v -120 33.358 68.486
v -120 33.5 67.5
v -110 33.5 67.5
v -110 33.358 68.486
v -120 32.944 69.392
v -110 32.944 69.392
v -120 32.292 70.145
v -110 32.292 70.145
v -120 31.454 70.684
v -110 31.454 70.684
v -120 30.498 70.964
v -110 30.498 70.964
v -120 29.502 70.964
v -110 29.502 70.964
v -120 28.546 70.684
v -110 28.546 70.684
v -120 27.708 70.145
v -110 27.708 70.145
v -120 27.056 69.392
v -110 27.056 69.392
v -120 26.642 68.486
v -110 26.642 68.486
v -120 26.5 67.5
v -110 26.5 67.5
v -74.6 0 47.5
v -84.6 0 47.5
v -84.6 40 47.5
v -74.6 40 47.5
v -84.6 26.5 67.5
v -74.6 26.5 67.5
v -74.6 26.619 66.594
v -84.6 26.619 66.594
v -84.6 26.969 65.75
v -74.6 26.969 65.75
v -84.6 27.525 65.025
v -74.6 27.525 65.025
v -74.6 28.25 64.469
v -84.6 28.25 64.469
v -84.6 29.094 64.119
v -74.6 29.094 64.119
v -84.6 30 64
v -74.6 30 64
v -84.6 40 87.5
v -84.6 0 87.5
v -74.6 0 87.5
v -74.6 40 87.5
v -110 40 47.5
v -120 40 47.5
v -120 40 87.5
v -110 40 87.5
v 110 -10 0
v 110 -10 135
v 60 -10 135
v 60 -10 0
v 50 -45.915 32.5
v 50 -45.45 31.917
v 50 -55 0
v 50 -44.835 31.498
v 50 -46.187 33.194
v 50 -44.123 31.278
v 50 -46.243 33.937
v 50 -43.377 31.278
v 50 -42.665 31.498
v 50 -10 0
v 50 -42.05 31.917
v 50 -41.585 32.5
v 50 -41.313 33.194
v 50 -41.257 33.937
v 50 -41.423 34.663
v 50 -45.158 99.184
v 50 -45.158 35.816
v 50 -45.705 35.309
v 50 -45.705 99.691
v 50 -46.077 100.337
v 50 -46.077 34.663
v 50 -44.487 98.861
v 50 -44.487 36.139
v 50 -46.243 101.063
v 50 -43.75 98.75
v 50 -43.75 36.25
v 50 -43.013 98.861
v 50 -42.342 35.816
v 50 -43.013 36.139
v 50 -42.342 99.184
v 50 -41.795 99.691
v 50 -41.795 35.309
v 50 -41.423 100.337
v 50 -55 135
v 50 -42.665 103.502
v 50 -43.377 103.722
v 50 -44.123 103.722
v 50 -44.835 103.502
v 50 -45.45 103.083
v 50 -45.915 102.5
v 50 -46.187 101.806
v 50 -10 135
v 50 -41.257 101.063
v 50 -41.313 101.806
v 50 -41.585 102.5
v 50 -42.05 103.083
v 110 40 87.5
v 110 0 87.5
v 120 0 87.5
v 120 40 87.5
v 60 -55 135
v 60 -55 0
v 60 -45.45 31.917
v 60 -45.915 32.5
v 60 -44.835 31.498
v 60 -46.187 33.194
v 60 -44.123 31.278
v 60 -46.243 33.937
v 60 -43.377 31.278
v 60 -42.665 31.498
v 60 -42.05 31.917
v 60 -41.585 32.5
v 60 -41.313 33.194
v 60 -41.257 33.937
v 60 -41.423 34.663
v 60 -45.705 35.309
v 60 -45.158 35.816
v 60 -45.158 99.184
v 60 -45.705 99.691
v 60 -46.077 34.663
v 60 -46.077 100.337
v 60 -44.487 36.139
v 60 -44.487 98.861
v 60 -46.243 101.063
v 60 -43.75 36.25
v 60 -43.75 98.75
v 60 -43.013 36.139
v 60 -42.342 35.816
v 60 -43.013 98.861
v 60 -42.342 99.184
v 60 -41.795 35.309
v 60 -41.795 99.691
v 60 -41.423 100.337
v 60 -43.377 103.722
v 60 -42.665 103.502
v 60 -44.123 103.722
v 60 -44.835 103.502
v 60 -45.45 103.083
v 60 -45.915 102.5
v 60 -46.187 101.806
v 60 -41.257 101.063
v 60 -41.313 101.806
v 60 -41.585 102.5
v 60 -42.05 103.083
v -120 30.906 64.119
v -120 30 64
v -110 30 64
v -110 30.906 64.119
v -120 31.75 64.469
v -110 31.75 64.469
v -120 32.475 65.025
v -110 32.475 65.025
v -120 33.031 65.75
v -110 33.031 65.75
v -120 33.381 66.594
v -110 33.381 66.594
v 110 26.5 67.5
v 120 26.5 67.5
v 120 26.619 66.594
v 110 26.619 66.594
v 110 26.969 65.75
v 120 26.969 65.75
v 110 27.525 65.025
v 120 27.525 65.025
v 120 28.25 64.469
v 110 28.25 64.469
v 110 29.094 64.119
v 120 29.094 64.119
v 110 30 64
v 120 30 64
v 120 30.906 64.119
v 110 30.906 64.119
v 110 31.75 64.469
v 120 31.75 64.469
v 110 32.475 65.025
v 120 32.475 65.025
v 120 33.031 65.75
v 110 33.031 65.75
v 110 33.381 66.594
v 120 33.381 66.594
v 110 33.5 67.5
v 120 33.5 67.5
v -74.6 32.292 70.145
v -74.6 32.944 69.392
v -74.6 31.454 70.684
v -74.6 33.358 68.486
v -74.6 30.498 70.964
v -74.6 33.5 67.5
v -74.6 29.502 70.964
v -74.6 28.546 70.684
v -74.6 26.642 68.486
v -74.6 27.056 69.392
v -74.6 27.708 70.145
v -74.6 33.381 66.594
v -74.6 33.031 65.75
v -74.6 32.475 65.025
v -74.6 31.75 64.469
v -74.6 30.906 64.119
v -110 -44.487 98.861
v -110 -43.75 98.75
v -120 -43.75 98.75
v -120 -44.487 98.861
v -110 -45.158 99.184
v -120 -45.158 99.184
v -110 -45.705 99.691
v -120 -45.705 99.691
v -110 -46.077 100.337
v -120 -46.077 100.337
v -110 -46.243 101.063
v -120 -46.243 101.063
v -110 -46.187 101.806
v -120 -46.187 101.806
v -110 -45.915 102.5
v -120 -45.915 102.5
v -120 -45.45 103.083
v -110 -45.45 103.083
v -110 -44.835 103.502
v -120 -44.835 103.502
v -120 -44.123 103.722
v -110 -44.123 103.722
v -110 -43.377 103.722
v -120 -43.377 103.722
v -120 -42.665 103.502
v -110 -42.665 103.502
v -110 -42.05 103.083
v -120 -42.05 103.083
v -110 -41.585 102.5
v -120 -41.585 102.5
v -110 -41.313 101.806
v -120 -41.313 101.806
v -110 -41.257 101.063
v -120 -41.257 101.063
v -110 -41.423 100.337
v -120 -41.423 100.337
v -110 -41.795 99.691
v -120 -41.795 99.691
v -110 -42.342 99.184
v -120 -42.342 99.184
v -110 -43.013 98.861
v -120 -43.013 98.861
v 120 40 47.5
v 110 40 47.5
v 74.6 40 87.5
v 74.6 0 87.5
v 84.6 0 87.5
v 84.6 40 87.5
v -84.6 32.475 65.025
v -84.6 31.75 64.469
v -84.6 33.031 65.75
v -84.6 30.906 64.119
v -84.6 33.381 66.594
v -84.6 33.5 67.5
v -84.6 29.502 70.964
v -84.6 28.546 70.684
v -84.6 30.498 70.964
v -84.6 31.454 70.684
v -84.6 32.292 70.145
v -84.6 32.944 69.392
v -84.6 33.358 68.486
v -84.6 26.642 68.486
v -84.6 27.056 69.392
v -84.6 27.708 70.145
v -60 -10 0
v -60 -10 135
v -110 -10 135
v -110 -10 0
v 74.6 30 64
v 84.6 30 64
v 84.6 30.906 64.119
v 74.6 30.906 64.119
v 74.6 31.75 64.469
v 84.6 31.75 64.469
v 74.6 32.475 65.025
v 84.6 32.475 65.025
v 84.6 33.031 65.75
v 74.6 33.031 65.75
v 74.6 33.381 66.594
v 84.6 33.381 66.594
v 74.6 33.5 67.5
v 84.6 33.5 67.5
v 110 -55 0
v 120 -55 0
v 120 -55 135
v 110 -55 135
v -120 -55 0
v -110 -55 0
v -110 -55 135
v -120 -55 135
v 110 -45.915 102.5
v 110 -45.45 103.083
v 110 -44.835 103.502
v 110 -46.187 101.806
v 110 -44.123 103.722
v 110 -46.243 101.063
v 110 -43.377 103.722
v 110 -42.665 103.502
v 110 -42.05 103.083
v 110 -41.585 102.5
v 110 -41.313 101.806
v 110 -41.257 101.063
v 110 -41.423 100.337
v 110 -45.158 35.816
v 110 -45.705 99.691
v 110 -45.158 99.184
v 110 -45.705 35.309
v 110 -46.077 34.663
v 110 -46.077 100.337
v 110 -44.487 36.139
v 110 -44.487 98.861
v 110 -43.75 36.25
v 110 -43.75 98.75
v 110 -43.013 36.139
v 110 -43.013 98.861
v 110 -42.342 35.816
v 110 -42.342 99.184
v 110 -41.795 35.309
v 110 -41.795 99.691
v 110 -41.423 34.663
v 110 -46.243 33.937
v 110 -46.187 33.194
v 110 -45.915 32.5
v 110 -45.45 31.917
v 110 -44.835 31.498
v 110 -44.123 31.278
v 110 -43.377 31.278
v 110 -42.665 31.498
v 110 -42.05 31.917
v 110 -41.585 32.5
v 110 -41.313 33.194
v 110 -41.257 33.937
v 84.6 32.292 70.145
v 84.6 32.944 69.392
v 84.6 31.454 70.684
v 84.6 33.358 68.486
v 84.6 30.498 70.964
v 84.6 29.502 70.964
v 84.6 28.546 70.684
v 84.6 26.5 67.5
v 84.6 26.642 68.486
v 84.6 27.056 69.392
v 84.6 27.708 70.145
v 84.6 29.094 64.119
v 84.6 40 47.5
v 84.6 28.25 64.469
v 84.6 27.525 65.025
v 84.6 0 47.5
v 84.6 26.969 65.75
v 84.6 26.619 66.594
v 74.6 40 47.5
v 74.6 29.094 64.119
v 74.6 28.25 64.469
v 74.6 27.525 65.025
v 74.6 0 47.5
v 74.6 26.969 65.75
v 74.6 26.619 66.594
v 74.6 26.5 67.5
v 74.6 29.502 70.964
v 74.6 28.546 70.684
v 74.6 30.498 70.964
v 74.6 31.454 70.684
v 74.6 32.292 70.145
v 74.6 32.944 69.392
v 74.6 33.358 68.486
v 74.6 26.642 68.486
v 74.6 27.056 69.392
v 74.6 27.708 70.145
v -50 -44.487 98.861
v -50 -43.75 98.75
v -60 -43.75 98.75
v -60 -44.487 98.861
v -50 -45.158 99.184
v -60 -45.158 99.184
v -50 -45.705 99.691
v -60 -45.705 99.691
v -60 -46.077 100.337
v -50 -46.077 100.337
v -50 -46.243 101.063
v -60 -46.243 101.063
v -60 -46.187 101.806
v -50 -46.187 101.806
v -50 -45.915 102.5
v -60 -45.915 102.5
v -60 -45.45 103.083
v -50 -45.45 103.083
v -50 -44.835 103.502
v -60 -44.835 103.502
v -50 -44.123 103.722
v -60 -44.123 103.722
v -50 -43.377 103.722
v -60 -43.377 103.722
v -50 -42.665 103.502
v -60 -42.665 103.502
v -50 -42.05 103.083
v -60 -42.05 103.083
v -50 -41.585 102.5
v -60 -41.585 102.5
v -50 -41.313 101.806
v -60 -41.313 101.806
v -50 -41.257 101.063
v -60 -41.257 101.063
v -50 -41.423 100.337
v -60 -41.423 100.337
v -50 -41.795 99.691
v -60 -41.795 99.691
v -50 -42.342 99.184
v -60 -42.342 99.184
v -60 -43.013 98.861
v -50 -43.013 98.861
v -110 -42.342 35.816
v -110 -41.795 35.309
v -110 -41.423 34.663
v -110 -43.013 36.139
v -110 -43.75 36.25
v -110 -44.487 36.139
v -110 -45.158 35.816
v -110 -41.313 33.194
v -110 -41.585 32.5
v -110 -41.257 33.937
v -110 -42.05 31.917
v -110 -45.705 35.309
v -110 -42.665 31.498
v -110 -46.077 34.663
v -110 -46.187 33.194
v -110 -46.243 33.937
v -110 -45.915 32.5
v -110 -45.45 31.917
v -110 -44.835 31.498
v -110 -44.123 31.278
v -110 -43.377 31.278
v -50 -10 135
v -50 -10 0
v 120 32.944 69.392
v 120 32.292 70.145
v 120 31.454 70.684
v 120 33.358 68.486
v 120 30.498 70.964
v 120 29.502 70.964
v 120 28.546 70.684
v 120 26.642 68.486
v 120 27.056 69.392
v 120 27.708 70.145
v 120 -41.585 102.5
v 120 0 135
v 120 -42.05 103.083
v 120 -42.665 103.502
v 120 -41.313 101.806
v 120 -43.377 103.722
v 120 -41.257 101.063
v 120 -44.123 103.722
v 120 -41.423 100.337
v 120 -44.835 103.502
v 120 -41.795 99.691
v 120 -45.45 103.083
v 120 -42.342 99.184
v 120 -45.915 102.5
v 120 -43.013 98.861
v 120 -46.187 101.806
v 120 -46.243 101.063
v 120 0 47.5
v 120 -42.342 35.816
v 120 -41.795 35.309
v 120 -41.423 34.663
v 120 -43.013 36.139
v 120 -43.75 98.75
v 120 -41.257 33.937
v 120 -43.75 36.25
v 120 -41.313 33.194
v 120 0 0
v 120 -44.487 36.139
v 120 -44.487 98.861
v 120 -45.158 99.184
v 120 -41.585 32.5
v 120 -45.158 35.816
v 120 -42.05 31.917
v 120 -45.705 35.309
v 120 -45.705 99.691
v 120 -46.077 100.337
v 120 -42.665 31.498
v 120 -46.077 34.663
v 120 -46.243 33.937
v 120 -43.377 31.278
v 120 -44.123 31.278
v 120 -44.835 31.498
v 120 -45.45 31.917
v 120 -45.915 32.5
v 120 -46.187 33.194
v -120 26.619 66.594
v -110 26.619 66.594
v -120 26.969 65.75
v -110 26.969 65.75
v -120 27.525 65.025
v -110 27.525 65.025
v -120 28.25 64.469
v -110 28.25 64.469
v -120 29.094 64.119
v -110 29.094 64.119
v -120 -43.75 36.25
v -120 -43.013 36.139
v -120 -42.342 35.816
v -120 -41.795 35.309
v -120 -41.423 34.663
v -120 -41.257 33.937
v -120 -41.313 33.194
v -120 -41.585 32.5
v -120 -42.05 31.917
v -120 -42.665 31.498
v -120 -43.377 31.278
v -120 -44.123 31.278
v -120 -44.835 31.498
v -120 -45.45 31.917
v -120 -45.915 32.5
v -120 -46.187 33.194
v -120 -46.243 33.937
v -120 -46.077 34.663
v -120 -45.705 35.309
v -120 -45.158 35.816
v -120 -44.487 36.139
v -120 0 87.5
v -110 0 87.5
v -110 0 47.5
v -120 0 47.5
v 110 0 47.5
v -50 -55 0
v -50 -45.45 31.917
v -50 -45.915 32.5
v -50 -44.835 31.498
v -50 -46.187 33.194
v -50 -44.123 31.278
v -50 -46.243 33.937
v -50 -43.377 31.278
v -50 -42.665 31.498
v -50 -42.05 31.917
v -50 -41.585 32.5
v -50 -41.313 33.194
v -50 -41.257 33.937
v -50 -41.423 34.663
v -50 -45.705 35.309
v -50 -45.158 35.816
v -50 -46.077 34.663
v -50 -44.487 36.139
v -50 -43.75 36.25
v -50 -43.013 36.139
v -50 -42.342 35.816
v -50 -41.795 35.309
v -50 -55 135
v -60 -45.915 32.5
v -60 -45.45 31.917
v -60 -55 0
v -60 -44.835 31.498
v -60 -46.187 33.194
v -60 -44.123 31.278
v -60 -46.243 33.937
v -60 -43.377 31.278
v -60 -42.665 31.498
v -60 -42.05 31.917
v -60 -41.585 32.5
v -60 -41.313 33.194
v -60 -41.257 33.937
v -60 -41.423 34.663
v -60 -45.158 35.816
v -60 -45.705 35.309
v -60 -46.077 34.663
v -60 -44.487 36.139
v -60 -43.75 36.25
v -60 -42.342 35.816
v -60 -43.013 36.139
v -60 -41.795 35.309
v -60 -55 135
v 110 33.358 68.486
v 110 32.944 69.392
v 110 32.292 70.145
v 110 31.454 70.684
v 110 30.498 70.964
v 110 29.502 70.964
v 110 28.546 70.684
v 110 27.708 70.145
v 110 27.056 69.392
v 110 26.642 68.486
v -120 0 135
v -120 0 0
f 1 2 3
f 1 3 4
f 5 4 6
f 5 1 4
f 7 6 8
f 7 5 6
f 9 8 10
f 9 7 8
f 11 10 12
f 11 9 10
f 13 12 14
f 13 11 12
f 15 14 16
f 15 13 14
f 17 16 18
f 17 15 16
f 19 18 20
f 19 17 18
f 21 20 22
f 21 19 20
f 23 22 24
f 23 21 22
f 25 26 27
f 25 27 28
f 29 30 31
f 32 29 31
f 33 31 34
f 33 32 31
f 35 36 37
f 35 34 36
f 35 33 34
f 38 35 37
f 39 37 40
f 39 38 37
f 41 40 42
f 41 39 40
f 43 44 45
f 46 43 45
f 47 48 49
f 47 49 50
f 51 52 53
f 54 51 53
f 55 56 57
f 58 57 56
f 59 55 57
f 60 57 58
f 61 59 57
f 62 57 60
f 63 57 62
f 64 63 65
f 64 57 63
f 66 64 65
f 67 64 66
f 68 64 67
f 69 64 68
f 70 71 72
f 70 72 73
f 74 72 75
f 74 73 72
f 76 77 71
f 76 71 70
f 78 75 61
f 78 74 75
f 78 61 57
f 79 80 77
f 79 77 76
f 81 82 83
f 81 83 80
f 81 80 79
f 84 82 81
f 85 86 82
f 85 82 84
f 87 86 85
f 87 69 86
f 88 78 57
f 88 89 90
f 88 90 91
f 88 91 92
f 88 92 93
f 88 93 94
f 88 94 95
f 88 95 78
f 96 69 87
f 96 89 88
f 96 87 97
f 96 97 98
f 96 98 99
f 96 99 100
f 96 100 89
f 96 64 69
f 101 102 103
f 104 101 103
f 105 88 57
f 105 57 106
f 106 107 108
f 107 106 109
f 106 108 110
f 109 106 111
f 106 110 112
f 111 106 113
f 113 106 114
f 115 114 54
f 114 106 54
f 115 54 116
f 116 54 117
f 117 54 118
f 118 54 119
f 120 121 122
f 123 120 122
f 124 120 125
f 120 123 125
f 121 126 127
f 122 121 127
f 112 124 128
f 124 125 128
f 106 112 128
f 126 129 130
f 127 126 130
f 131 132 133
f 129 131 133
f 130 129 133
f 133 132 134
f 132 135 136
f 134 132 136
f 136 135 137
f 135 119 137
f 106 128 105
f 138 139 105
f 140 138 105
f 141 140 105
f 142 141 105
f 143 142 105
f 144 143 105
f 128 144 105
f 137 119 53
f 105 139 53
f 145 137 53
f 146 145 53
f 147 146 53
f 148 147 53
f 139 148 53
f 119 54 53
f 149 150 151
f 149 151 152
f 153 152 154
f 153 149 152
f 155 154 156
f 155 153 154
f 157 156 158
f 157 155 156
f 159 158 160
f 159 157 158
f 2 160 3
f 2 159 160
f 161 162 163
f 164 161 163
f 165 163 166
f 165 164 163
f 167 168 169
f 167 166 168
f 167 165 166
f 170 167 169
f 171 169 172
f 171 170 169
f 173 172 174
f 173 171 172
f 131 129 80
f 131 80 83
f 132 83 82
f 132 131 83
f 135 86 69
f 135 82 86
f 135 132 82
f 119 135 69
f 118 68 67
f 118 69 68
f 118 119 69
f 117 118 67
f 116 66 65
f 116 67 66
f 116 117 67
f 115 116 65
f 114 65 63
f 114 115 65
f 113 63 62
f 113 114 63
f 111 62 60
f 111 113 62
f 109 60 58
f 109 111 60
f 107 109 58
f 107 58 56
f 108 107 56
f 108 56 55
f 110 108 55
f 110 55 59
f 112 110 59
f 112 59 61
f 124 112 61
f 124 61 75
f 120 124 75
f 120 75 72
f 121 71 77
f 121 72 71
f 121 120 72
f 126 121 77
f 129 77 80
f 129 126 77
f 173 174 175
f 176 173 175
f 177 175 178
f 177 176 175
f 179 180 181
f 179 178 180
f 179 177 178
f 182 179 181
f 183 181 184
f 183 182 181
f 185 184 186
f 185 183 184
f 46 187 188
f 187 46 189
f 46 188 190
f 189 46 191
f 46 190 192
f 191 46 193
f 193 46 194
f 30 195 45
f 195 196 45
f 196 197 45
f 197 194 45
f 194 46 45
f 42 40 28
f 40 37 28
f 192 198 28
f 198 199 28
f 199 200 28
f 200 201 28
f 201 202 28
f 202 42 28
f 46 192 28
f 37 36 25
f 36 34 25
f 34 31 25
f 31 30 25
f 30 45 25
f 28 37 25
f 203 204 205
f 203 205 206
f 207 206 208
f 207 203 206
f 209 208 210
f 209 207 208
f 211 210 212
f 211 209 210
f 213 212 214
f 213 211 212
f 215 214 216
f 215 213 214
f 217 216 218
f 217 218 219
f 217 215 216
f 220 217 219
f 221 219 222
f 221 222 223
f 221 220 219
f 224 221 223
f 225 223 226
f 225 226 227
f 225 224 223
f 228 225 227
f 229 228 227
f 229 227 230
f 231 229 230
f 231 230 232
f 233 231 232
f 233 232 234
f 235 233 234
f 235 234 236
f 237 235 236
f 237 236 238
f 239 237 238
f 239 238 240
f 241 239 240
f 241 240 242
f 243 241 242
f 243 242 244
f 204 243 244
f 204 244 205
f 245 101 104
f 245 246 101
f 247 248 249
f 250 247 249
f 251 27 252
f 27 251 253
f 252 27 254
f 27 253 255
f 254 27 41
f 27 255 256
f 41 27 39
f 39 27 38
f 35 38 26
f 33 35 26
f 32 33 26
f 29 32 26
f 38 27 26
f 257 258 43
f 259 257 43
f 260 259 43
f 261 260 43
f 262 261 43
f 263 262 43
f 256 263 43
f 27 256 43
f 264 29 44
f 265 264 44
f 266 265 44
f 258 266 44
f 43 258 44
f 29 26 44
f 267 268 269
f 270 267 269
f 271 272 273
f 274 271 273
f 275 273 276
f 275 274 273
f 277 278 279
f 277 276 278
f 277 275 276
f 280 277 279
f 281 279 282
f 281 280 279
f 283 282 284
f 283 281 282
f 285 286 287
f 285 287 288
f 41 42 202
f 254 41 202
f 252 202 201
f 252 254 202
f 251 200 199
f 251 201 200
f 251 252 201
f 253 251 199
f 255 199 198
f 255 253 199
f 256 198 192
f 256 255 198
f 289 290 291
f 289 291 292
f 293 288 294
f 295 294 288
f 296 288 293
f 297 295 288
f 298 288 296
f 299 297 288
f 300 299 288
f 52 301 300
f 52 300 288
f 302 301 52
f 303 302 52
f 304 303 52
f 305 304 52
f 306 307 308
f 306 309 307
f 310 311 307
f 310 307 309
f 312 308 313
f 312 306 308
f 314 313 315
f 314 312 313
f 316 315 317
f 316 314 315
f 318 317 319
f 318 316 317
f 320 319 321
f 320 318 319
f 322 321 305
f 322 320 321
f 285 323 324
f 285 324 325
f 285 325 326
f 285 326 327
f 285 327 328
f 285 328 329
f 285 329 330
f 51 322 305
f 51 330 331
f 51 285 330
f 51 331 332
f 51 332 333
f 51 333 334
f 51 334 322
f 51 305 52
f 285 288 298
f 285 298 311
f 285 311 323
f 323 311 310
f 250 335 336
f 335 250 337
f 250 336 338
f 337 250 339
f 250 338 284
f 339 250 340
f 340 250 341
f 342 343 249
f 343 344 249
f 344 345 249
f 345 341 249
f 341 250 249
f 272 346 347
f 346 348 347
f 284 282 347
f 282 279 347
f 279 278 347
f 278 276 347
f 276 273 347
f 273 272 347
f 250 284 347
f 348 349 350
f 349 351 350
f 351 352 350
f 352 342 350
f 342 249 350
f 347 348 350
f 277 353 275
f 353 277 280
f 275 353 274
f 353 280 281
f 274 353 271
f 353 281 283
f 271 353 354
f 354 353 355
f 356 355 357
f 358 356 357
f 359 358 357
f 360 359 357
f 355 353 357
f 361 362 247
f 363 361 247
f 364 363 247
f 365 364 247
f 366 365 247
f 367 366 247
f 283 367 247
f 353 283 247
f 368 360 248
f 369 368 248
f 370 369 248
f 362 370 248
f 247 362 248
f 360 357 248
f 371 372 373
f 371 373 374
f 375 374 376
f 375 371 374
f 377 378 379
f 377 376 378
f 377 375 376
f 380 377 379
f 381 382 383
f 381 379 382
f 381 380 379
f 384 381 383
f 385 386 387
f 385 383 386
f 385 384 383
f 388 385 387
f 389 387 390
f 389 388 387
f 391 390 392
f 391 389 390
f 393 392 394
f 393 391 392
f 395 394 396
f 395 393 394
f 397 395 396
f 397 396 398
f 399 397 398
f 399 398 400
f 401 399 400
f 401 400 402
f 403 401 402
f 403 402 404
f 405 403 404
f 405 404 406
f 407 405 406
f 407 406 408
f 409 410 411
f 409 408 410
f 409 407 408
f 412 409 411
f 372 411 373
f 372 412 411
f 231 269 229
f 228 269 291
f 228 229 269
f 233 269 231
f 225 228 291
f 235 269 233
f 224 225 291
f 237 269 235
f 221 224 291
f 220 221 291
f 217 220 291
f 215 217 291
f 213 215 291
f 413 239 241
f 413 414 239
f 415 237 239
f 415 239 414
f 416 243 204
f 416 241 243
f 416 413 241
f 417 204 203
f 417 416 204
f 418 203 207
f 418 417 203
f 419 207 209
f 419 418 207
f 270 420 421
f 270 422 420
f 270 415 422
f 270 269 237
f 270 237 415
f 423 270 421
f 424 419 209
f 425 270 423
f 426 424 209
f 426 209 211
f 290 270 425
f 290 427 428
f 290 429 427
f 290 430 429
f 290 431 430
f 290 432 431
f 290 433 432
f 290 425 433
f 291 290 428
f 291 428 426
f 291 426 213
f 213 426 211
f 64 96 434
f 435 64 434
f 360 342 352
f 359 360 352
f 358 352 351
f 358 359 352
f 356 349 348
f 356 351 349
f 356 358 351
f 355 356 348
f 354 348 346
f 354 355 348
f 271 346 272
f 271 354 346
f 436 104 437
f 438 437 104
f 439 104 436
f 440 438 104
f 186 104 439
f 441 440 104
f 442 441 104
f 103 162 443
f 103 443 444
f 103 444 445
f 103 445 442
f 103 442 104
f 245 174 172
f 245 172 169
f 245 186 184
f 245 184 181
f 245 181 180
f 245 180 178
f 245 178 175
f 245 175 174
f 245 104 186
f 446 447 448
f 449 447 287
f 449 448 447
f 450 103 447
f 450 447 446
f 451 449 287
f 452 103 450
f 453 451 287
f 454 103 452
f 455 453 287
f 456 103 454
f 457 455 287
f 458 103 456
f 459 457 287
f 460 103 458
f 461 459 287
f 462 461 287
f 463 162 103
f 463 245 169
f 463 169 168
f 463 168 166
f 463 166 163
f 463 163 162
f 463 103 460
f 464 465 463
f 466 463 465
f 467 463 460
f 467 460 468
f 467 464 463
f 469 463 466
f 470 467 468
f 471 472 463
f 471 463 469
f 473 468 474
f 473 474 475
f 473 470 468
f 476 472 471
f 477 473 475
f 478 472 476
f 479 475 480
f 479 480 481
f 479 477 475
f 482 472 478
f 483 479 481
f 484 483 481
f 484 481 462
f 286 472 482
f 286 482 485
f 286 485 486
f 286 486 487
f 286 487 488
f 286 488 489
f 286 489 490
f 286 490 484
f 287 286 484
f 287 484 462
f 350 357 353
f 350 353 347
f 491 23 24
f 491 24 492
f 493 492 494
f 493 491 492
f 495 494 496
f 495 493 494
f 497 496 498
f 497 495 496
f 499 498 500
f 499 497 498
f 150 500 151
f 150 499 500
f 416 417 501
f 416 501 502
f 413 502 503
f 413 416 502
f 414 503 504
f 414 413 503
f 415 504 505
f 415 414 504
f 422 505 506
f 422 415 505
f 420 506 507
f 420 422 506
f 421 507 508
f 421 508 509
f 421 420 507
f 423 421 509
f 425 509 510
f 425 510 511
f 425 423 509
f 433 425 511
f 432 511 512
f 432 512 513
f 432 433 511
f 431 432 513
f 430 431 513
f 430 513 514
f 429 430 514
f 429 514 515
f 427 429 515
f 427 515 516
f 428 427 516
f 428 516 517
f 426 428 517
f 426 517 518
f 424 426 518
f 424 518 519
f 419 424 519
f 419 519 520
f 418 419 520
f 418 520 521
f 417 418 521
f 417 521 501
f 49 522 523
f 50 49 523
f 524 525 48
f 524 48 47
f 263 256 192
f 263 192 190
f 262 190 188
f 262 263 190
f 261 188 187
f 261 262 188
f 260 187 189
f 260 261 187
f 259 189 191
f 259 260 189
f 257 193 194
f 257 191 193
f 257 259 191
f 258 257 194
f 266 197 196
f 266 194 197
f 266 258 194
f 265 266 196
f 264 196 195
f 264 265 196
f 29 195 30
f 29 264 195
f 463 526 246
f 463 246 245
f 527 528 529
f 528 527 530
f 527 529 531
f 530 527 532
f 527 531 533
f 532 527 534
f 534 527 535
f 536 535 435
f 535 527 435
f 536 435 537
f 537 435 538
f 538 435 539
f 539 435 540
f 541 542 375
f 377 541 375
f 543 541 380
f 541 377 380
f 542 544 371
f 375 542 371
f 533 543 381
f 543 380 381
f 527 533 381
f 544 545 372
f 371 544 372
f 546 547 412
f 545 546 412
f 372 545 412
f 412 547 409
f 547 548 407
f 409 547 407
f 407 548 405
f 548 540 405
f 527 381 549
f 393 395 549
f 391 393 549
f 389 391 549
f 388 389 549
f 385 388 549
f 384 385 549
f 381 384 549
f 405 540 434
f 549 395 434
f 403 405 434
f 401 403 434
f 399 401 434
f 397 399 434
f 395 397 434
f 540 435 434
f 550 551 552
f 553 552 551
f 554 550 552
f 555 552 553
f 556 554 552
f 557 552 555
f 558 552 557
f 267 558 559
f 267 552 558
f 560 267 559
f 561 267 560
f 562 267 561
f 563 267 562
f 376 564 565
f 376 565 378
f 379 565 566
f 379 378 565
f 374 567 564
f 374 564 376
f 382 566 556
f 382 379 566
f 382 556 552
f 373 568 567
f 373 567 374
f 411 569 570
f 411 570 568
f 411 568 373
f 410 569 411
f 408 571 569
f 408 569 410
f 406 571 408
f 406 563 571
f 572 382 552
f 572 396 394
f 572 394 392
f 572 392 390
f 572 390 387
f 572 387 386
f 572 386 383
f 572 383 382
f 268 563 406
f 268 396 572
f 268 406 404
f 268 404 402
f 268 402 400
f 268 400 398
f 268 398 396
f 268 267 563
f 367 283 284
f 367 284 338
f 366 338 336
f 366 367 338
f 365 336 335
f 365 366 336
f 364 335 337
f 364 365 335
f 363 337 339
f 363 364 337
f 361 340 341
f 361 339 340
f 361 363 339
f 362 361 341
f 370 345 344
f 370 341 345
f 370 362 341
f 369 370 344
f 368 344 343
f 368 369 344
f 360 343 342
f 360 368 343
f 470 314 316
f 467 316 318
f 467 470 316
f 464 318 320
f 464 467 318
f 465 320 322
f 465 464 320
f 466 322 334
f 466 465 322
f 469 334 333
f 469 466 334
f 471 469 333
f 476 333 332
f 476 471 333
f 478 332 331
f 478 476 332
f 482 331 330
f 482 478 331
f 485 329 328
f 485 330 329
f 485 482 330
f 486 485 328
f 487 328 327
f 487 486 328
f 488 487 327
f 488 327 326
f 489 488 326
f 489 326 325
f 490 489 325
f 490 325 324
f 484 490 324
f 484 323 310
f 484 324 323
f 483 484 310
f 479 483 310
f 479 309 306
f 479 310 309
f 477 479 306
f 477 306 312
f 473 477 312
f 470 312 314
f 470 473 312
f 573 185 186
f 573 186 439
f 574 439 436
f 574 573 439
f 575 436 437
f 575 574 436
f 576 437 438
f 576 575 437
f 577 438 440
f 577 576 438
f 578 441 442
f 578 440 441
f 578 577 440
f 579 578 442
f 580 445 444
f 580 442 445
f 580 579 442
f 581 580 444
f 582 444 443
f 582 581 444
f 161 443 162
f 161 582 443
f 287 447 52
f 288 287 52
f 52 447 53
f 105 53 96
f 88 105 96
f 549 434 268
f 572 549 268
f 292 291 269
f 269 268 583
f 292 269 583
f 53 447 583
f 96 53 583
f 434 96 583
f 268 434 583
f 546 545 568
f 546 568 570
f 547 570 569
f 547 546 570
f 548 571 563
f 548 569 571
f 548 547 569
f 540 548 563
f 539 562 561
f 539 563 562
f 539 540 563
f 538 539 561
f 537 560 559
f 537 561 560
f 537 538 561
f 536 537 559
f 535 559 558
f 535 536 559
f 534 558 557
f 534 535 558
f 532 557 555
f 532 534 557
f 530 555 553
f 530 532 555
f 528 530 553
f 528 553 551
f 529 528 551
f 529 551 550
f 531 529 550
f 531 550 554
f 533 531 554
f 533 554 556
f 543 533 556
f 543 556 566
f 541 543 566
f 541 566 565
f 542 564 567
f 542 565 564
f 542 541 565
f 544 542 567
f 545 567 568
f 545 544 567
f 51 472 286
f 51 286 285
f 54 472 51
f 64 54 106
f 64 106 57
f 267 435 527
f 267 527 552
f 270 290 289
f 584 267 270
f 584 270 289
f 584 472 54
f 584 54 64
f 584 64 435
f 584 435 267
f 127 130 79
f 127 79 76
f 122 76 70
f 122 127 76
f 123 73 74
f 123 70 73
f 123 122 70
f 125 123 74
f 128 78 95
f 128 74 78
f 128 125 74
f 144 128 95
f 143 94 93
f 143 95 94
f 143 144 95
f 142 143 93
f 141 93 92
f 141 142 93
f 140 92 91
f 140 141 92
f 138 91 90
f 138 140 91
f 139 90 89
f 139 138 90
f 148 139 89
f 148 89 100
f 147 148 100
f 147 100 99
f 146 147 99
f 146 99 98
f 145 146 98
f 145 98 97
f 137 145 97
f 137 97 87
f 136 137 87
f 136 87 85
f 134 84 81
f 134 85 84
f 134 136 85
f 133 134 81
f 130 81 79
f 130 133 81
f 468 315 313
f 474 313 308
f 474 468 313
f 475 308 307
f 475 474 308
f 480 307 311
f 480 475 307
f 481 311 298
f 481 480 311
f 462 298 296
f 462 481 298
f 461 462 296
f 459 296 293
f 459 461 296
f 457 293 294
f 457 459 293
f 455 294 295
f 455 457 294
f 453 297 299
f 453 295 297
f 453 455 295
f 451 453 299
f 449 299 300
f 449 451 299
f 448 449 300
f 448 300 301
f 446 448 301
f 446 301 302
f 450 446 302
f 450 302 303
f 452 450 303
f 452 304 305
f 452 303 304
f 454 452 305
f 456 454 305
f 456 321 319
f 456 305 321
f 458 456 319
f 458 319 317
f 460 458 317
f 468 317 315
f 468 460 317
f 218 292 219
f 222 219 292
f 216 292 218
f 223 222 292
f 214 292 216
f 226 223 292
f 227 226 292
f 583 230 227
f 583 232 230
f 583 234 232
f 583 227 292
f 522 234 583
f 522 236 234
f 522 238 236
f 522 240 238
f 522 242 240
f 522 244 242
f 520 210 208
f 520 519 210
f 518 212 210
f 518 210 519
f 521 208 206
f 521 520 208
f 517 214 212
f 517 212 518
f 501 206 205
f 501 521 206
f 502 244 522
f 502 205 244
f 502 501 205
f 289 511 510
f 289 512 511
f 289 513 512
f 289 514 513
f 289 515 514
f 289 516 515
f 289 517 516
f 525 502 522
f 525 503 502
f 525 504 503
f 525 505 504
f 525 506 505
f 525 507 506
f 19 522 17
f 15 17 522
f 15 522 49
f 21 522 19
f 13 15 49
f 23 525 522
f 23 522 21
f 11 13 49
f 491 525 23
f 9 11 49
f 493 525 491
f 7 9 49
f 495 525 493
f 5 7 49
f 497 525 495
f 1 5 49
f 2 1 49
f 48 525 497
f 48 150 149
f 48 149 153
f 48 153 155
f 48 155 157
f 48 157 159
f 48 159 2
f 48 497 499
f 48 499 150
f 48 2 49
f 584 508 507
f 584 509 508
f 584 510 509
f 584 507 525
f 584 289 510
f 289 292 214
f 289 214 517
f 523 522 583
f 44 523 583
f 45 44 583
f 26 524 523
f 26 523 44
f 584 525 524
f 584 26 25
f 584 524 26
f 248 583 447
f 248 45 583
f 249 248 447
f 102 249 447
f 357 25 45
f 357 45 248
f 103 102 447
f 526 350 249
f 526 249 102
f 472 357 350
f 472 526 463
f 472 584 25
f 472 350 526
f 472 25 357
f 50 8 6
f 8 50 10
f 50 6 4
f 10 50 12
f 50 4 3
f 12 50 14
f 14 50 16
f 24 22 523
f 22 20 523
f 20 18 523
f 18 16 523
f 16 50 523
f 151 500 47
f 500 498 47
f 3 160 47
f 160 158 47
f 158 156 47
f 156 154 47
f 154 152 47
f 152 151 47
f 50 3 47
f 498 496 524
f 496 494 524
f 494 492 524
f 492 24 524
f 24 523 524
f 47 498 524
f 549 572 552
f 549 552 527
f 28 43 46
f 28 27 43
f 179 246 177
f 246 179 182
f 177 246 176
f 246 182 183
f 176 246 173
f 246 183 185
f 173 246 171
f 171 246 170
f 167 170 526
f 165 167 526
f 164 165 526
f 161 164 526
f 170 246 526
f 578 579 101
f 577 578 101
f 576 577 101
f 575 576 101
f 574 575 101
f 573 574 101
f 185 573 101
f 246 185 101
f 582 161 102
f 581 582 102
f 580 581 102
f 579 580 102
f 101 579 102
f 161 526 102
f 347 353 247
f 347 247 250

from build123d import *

# Parameters (mm, degrees)
BOSS_EXTRUDE1_DEPTH     = 135
SKETCH3_W               = 10
SKETCH3_H               = 135
BOSS_EXTRUDE2_DEPTH     = 45
CUT_EXTRUDE1_DEPTH      = 230
CUT_EXTRUDE1_DEPTH_BACK = 10
SKETCH4_W               = 10
SKETCH4_H               = 20
BOSS_EXTRUDE3_DEPTH     = 40
CUT_EXTRUDE2_DEPTH      = 281.802421642
CUT_EXTRUDE2_DEPTH_BACK = 240


with BuildPart() as part:
    # Sketch1 → Boss-Extrude1 (new body)
    with BuildSketch(Plane.XY):
        Polygon((-120, 0), (120, 0), (120, -55), (110, -55), (110, -10), (-110, -10), (-110, -55), (-120, -55), align=None)
    extrude(amount=BOSS_EXTRUDE1_DEPTH)

    # Sketch3 → Boss-Extrude2 (add)
    with BuildSketch(Plane.XZ.offset(10)):
        with Locations((55, 67.5)):
            Rectangle(SKETCH3_W, SKETCH3_H)
        with Locations((-55, 67.5)):
            Rectangle(SKETCH3_W, SKETCH3_H)
    extrude(amount=BOSS_EXTRUDE2_DEPTH)

    # Sketch2 → Cut-Extrude1 (cut, two sides: drawn at the far end of the back side and taken through both)
    with BuildSketch(Plane.ZY.offset(-110).offset(-CUT_EXTRUDE1_DEPTH_BACK)):
        with BuildLine():
            ThreePointArc((31.25, -43.75), (33.75, -46.25), (36.25, -43.75))
            Line((36.25, -43.75), (33.75, -43.75))
            Line((33.75, -43.75), (31.25, -43.75))
        make_face()
        with BuildLine():
            Line((33.75, -43.75), (36.25, -43.75))
            ThreePointArc((36.25, -43.75), (33.75, -41.25), (31.25, -43.75))
            Line((31.25, -43.75), (33.75, -43.75))
        make_face()
        with BuildLine():
            Line((98.75, -43.75), (101.25, -43.75))
            Line((101.25, -43.75), (103.75, -43.75))
            ThreePointArc((103.75, -43.75), (101.25, -41.25), (98.75, -43.75))
        make_face()
        with BuildLine():
            Line((103.75, -43.75), (101.25, -43.75))
            Line((101.25, -43.75), (98.75, -43.75))
            ThreePointArc((98.75, -43.75), (101.25, -46.25), (103.75, -43.75))
        make_face()
    extrude(amount=CUT_EXTRUDE1_DEPTH + CUT_EXTRUDE1_DEPTH_BACK, mode=Mode.SUBTRACT)

    # Sketch4 → Boss-Extrude3 (add)
    with BuildSketch(Plane(origin=(0, 0, 0), x_dir=(1, 0, 0), z_dir=(0, 1, 0))):
        with Locations((-115, -57.5)):
            Rectangle(SKETCH4_W, SKETCH4_H)
        with Locations((-115, -77.5)):
            Rectangle(SKETCH4_W, SKETCH4_H)
        with Locations((-79.6, -77.5)):
            Rectangle(SKETCH4_W, SKETCH4_H)
        with Locations((-79.6, -57.5)):
            Rectangle(SKETCH4_W, SKETCH4_H)
        with Locations((79.6, -57.5)):
            Rectangle(SKETCH4_W, SKETCH4_H)
        with Locations((79.6, -77.5)):
            Rectangle(SKETCH4_W, SKETCH4_H)
        with Locations((115, -77.5)):
            Rectangle(SKETCH4_W, SKETCH4_H)
        with Locations((115, -57.5)):
            Rectangle(SKETCH4_W, SKETCH4_H)
    extrude(amount=BOSS_EXTRUDE3_DEPTH)

    # Sketch5 → Cut-Extrude2 (cut, two sides: drawn at the far end of the back side and taken through both)
    with BuildSketch(Plane(origin=(120, 0, 0), x_dir=(0, 0, -1), z_dir=(1, 0, 0)).offset(-CUT_EXTRUDE2_DEPTH_BACK)):
        with BuildLine():
            ThreePointArc((-67.5, 33.5), (-71, 30), (-67.5, 26.5))
            Line((-67.5, 26.5), (-67.5, 30))
            Line((-67.5, 30), (-67.5, 33.5))
        make_face()
        with BuildLine():
            Line((-67.5, 30), (-67.5, 26.5))
            ThreePointArc((-67.5, 26.5), (-65.025126266, 27.525126266), (-64, 30))
            ThreePointArc((-64, 30), (-65.025126266, 32.474873734), (-67.5, 33.5))
            Line((-67.5, 33.5), (-67.5, 30))
        make_face()
    extrude(amount=CUT_EXTRUDE2_DEPTH + CUT_EXTRUDE2_DEPTH_BACK, mode=Mode.SUBTRACT)


solid = part.part
